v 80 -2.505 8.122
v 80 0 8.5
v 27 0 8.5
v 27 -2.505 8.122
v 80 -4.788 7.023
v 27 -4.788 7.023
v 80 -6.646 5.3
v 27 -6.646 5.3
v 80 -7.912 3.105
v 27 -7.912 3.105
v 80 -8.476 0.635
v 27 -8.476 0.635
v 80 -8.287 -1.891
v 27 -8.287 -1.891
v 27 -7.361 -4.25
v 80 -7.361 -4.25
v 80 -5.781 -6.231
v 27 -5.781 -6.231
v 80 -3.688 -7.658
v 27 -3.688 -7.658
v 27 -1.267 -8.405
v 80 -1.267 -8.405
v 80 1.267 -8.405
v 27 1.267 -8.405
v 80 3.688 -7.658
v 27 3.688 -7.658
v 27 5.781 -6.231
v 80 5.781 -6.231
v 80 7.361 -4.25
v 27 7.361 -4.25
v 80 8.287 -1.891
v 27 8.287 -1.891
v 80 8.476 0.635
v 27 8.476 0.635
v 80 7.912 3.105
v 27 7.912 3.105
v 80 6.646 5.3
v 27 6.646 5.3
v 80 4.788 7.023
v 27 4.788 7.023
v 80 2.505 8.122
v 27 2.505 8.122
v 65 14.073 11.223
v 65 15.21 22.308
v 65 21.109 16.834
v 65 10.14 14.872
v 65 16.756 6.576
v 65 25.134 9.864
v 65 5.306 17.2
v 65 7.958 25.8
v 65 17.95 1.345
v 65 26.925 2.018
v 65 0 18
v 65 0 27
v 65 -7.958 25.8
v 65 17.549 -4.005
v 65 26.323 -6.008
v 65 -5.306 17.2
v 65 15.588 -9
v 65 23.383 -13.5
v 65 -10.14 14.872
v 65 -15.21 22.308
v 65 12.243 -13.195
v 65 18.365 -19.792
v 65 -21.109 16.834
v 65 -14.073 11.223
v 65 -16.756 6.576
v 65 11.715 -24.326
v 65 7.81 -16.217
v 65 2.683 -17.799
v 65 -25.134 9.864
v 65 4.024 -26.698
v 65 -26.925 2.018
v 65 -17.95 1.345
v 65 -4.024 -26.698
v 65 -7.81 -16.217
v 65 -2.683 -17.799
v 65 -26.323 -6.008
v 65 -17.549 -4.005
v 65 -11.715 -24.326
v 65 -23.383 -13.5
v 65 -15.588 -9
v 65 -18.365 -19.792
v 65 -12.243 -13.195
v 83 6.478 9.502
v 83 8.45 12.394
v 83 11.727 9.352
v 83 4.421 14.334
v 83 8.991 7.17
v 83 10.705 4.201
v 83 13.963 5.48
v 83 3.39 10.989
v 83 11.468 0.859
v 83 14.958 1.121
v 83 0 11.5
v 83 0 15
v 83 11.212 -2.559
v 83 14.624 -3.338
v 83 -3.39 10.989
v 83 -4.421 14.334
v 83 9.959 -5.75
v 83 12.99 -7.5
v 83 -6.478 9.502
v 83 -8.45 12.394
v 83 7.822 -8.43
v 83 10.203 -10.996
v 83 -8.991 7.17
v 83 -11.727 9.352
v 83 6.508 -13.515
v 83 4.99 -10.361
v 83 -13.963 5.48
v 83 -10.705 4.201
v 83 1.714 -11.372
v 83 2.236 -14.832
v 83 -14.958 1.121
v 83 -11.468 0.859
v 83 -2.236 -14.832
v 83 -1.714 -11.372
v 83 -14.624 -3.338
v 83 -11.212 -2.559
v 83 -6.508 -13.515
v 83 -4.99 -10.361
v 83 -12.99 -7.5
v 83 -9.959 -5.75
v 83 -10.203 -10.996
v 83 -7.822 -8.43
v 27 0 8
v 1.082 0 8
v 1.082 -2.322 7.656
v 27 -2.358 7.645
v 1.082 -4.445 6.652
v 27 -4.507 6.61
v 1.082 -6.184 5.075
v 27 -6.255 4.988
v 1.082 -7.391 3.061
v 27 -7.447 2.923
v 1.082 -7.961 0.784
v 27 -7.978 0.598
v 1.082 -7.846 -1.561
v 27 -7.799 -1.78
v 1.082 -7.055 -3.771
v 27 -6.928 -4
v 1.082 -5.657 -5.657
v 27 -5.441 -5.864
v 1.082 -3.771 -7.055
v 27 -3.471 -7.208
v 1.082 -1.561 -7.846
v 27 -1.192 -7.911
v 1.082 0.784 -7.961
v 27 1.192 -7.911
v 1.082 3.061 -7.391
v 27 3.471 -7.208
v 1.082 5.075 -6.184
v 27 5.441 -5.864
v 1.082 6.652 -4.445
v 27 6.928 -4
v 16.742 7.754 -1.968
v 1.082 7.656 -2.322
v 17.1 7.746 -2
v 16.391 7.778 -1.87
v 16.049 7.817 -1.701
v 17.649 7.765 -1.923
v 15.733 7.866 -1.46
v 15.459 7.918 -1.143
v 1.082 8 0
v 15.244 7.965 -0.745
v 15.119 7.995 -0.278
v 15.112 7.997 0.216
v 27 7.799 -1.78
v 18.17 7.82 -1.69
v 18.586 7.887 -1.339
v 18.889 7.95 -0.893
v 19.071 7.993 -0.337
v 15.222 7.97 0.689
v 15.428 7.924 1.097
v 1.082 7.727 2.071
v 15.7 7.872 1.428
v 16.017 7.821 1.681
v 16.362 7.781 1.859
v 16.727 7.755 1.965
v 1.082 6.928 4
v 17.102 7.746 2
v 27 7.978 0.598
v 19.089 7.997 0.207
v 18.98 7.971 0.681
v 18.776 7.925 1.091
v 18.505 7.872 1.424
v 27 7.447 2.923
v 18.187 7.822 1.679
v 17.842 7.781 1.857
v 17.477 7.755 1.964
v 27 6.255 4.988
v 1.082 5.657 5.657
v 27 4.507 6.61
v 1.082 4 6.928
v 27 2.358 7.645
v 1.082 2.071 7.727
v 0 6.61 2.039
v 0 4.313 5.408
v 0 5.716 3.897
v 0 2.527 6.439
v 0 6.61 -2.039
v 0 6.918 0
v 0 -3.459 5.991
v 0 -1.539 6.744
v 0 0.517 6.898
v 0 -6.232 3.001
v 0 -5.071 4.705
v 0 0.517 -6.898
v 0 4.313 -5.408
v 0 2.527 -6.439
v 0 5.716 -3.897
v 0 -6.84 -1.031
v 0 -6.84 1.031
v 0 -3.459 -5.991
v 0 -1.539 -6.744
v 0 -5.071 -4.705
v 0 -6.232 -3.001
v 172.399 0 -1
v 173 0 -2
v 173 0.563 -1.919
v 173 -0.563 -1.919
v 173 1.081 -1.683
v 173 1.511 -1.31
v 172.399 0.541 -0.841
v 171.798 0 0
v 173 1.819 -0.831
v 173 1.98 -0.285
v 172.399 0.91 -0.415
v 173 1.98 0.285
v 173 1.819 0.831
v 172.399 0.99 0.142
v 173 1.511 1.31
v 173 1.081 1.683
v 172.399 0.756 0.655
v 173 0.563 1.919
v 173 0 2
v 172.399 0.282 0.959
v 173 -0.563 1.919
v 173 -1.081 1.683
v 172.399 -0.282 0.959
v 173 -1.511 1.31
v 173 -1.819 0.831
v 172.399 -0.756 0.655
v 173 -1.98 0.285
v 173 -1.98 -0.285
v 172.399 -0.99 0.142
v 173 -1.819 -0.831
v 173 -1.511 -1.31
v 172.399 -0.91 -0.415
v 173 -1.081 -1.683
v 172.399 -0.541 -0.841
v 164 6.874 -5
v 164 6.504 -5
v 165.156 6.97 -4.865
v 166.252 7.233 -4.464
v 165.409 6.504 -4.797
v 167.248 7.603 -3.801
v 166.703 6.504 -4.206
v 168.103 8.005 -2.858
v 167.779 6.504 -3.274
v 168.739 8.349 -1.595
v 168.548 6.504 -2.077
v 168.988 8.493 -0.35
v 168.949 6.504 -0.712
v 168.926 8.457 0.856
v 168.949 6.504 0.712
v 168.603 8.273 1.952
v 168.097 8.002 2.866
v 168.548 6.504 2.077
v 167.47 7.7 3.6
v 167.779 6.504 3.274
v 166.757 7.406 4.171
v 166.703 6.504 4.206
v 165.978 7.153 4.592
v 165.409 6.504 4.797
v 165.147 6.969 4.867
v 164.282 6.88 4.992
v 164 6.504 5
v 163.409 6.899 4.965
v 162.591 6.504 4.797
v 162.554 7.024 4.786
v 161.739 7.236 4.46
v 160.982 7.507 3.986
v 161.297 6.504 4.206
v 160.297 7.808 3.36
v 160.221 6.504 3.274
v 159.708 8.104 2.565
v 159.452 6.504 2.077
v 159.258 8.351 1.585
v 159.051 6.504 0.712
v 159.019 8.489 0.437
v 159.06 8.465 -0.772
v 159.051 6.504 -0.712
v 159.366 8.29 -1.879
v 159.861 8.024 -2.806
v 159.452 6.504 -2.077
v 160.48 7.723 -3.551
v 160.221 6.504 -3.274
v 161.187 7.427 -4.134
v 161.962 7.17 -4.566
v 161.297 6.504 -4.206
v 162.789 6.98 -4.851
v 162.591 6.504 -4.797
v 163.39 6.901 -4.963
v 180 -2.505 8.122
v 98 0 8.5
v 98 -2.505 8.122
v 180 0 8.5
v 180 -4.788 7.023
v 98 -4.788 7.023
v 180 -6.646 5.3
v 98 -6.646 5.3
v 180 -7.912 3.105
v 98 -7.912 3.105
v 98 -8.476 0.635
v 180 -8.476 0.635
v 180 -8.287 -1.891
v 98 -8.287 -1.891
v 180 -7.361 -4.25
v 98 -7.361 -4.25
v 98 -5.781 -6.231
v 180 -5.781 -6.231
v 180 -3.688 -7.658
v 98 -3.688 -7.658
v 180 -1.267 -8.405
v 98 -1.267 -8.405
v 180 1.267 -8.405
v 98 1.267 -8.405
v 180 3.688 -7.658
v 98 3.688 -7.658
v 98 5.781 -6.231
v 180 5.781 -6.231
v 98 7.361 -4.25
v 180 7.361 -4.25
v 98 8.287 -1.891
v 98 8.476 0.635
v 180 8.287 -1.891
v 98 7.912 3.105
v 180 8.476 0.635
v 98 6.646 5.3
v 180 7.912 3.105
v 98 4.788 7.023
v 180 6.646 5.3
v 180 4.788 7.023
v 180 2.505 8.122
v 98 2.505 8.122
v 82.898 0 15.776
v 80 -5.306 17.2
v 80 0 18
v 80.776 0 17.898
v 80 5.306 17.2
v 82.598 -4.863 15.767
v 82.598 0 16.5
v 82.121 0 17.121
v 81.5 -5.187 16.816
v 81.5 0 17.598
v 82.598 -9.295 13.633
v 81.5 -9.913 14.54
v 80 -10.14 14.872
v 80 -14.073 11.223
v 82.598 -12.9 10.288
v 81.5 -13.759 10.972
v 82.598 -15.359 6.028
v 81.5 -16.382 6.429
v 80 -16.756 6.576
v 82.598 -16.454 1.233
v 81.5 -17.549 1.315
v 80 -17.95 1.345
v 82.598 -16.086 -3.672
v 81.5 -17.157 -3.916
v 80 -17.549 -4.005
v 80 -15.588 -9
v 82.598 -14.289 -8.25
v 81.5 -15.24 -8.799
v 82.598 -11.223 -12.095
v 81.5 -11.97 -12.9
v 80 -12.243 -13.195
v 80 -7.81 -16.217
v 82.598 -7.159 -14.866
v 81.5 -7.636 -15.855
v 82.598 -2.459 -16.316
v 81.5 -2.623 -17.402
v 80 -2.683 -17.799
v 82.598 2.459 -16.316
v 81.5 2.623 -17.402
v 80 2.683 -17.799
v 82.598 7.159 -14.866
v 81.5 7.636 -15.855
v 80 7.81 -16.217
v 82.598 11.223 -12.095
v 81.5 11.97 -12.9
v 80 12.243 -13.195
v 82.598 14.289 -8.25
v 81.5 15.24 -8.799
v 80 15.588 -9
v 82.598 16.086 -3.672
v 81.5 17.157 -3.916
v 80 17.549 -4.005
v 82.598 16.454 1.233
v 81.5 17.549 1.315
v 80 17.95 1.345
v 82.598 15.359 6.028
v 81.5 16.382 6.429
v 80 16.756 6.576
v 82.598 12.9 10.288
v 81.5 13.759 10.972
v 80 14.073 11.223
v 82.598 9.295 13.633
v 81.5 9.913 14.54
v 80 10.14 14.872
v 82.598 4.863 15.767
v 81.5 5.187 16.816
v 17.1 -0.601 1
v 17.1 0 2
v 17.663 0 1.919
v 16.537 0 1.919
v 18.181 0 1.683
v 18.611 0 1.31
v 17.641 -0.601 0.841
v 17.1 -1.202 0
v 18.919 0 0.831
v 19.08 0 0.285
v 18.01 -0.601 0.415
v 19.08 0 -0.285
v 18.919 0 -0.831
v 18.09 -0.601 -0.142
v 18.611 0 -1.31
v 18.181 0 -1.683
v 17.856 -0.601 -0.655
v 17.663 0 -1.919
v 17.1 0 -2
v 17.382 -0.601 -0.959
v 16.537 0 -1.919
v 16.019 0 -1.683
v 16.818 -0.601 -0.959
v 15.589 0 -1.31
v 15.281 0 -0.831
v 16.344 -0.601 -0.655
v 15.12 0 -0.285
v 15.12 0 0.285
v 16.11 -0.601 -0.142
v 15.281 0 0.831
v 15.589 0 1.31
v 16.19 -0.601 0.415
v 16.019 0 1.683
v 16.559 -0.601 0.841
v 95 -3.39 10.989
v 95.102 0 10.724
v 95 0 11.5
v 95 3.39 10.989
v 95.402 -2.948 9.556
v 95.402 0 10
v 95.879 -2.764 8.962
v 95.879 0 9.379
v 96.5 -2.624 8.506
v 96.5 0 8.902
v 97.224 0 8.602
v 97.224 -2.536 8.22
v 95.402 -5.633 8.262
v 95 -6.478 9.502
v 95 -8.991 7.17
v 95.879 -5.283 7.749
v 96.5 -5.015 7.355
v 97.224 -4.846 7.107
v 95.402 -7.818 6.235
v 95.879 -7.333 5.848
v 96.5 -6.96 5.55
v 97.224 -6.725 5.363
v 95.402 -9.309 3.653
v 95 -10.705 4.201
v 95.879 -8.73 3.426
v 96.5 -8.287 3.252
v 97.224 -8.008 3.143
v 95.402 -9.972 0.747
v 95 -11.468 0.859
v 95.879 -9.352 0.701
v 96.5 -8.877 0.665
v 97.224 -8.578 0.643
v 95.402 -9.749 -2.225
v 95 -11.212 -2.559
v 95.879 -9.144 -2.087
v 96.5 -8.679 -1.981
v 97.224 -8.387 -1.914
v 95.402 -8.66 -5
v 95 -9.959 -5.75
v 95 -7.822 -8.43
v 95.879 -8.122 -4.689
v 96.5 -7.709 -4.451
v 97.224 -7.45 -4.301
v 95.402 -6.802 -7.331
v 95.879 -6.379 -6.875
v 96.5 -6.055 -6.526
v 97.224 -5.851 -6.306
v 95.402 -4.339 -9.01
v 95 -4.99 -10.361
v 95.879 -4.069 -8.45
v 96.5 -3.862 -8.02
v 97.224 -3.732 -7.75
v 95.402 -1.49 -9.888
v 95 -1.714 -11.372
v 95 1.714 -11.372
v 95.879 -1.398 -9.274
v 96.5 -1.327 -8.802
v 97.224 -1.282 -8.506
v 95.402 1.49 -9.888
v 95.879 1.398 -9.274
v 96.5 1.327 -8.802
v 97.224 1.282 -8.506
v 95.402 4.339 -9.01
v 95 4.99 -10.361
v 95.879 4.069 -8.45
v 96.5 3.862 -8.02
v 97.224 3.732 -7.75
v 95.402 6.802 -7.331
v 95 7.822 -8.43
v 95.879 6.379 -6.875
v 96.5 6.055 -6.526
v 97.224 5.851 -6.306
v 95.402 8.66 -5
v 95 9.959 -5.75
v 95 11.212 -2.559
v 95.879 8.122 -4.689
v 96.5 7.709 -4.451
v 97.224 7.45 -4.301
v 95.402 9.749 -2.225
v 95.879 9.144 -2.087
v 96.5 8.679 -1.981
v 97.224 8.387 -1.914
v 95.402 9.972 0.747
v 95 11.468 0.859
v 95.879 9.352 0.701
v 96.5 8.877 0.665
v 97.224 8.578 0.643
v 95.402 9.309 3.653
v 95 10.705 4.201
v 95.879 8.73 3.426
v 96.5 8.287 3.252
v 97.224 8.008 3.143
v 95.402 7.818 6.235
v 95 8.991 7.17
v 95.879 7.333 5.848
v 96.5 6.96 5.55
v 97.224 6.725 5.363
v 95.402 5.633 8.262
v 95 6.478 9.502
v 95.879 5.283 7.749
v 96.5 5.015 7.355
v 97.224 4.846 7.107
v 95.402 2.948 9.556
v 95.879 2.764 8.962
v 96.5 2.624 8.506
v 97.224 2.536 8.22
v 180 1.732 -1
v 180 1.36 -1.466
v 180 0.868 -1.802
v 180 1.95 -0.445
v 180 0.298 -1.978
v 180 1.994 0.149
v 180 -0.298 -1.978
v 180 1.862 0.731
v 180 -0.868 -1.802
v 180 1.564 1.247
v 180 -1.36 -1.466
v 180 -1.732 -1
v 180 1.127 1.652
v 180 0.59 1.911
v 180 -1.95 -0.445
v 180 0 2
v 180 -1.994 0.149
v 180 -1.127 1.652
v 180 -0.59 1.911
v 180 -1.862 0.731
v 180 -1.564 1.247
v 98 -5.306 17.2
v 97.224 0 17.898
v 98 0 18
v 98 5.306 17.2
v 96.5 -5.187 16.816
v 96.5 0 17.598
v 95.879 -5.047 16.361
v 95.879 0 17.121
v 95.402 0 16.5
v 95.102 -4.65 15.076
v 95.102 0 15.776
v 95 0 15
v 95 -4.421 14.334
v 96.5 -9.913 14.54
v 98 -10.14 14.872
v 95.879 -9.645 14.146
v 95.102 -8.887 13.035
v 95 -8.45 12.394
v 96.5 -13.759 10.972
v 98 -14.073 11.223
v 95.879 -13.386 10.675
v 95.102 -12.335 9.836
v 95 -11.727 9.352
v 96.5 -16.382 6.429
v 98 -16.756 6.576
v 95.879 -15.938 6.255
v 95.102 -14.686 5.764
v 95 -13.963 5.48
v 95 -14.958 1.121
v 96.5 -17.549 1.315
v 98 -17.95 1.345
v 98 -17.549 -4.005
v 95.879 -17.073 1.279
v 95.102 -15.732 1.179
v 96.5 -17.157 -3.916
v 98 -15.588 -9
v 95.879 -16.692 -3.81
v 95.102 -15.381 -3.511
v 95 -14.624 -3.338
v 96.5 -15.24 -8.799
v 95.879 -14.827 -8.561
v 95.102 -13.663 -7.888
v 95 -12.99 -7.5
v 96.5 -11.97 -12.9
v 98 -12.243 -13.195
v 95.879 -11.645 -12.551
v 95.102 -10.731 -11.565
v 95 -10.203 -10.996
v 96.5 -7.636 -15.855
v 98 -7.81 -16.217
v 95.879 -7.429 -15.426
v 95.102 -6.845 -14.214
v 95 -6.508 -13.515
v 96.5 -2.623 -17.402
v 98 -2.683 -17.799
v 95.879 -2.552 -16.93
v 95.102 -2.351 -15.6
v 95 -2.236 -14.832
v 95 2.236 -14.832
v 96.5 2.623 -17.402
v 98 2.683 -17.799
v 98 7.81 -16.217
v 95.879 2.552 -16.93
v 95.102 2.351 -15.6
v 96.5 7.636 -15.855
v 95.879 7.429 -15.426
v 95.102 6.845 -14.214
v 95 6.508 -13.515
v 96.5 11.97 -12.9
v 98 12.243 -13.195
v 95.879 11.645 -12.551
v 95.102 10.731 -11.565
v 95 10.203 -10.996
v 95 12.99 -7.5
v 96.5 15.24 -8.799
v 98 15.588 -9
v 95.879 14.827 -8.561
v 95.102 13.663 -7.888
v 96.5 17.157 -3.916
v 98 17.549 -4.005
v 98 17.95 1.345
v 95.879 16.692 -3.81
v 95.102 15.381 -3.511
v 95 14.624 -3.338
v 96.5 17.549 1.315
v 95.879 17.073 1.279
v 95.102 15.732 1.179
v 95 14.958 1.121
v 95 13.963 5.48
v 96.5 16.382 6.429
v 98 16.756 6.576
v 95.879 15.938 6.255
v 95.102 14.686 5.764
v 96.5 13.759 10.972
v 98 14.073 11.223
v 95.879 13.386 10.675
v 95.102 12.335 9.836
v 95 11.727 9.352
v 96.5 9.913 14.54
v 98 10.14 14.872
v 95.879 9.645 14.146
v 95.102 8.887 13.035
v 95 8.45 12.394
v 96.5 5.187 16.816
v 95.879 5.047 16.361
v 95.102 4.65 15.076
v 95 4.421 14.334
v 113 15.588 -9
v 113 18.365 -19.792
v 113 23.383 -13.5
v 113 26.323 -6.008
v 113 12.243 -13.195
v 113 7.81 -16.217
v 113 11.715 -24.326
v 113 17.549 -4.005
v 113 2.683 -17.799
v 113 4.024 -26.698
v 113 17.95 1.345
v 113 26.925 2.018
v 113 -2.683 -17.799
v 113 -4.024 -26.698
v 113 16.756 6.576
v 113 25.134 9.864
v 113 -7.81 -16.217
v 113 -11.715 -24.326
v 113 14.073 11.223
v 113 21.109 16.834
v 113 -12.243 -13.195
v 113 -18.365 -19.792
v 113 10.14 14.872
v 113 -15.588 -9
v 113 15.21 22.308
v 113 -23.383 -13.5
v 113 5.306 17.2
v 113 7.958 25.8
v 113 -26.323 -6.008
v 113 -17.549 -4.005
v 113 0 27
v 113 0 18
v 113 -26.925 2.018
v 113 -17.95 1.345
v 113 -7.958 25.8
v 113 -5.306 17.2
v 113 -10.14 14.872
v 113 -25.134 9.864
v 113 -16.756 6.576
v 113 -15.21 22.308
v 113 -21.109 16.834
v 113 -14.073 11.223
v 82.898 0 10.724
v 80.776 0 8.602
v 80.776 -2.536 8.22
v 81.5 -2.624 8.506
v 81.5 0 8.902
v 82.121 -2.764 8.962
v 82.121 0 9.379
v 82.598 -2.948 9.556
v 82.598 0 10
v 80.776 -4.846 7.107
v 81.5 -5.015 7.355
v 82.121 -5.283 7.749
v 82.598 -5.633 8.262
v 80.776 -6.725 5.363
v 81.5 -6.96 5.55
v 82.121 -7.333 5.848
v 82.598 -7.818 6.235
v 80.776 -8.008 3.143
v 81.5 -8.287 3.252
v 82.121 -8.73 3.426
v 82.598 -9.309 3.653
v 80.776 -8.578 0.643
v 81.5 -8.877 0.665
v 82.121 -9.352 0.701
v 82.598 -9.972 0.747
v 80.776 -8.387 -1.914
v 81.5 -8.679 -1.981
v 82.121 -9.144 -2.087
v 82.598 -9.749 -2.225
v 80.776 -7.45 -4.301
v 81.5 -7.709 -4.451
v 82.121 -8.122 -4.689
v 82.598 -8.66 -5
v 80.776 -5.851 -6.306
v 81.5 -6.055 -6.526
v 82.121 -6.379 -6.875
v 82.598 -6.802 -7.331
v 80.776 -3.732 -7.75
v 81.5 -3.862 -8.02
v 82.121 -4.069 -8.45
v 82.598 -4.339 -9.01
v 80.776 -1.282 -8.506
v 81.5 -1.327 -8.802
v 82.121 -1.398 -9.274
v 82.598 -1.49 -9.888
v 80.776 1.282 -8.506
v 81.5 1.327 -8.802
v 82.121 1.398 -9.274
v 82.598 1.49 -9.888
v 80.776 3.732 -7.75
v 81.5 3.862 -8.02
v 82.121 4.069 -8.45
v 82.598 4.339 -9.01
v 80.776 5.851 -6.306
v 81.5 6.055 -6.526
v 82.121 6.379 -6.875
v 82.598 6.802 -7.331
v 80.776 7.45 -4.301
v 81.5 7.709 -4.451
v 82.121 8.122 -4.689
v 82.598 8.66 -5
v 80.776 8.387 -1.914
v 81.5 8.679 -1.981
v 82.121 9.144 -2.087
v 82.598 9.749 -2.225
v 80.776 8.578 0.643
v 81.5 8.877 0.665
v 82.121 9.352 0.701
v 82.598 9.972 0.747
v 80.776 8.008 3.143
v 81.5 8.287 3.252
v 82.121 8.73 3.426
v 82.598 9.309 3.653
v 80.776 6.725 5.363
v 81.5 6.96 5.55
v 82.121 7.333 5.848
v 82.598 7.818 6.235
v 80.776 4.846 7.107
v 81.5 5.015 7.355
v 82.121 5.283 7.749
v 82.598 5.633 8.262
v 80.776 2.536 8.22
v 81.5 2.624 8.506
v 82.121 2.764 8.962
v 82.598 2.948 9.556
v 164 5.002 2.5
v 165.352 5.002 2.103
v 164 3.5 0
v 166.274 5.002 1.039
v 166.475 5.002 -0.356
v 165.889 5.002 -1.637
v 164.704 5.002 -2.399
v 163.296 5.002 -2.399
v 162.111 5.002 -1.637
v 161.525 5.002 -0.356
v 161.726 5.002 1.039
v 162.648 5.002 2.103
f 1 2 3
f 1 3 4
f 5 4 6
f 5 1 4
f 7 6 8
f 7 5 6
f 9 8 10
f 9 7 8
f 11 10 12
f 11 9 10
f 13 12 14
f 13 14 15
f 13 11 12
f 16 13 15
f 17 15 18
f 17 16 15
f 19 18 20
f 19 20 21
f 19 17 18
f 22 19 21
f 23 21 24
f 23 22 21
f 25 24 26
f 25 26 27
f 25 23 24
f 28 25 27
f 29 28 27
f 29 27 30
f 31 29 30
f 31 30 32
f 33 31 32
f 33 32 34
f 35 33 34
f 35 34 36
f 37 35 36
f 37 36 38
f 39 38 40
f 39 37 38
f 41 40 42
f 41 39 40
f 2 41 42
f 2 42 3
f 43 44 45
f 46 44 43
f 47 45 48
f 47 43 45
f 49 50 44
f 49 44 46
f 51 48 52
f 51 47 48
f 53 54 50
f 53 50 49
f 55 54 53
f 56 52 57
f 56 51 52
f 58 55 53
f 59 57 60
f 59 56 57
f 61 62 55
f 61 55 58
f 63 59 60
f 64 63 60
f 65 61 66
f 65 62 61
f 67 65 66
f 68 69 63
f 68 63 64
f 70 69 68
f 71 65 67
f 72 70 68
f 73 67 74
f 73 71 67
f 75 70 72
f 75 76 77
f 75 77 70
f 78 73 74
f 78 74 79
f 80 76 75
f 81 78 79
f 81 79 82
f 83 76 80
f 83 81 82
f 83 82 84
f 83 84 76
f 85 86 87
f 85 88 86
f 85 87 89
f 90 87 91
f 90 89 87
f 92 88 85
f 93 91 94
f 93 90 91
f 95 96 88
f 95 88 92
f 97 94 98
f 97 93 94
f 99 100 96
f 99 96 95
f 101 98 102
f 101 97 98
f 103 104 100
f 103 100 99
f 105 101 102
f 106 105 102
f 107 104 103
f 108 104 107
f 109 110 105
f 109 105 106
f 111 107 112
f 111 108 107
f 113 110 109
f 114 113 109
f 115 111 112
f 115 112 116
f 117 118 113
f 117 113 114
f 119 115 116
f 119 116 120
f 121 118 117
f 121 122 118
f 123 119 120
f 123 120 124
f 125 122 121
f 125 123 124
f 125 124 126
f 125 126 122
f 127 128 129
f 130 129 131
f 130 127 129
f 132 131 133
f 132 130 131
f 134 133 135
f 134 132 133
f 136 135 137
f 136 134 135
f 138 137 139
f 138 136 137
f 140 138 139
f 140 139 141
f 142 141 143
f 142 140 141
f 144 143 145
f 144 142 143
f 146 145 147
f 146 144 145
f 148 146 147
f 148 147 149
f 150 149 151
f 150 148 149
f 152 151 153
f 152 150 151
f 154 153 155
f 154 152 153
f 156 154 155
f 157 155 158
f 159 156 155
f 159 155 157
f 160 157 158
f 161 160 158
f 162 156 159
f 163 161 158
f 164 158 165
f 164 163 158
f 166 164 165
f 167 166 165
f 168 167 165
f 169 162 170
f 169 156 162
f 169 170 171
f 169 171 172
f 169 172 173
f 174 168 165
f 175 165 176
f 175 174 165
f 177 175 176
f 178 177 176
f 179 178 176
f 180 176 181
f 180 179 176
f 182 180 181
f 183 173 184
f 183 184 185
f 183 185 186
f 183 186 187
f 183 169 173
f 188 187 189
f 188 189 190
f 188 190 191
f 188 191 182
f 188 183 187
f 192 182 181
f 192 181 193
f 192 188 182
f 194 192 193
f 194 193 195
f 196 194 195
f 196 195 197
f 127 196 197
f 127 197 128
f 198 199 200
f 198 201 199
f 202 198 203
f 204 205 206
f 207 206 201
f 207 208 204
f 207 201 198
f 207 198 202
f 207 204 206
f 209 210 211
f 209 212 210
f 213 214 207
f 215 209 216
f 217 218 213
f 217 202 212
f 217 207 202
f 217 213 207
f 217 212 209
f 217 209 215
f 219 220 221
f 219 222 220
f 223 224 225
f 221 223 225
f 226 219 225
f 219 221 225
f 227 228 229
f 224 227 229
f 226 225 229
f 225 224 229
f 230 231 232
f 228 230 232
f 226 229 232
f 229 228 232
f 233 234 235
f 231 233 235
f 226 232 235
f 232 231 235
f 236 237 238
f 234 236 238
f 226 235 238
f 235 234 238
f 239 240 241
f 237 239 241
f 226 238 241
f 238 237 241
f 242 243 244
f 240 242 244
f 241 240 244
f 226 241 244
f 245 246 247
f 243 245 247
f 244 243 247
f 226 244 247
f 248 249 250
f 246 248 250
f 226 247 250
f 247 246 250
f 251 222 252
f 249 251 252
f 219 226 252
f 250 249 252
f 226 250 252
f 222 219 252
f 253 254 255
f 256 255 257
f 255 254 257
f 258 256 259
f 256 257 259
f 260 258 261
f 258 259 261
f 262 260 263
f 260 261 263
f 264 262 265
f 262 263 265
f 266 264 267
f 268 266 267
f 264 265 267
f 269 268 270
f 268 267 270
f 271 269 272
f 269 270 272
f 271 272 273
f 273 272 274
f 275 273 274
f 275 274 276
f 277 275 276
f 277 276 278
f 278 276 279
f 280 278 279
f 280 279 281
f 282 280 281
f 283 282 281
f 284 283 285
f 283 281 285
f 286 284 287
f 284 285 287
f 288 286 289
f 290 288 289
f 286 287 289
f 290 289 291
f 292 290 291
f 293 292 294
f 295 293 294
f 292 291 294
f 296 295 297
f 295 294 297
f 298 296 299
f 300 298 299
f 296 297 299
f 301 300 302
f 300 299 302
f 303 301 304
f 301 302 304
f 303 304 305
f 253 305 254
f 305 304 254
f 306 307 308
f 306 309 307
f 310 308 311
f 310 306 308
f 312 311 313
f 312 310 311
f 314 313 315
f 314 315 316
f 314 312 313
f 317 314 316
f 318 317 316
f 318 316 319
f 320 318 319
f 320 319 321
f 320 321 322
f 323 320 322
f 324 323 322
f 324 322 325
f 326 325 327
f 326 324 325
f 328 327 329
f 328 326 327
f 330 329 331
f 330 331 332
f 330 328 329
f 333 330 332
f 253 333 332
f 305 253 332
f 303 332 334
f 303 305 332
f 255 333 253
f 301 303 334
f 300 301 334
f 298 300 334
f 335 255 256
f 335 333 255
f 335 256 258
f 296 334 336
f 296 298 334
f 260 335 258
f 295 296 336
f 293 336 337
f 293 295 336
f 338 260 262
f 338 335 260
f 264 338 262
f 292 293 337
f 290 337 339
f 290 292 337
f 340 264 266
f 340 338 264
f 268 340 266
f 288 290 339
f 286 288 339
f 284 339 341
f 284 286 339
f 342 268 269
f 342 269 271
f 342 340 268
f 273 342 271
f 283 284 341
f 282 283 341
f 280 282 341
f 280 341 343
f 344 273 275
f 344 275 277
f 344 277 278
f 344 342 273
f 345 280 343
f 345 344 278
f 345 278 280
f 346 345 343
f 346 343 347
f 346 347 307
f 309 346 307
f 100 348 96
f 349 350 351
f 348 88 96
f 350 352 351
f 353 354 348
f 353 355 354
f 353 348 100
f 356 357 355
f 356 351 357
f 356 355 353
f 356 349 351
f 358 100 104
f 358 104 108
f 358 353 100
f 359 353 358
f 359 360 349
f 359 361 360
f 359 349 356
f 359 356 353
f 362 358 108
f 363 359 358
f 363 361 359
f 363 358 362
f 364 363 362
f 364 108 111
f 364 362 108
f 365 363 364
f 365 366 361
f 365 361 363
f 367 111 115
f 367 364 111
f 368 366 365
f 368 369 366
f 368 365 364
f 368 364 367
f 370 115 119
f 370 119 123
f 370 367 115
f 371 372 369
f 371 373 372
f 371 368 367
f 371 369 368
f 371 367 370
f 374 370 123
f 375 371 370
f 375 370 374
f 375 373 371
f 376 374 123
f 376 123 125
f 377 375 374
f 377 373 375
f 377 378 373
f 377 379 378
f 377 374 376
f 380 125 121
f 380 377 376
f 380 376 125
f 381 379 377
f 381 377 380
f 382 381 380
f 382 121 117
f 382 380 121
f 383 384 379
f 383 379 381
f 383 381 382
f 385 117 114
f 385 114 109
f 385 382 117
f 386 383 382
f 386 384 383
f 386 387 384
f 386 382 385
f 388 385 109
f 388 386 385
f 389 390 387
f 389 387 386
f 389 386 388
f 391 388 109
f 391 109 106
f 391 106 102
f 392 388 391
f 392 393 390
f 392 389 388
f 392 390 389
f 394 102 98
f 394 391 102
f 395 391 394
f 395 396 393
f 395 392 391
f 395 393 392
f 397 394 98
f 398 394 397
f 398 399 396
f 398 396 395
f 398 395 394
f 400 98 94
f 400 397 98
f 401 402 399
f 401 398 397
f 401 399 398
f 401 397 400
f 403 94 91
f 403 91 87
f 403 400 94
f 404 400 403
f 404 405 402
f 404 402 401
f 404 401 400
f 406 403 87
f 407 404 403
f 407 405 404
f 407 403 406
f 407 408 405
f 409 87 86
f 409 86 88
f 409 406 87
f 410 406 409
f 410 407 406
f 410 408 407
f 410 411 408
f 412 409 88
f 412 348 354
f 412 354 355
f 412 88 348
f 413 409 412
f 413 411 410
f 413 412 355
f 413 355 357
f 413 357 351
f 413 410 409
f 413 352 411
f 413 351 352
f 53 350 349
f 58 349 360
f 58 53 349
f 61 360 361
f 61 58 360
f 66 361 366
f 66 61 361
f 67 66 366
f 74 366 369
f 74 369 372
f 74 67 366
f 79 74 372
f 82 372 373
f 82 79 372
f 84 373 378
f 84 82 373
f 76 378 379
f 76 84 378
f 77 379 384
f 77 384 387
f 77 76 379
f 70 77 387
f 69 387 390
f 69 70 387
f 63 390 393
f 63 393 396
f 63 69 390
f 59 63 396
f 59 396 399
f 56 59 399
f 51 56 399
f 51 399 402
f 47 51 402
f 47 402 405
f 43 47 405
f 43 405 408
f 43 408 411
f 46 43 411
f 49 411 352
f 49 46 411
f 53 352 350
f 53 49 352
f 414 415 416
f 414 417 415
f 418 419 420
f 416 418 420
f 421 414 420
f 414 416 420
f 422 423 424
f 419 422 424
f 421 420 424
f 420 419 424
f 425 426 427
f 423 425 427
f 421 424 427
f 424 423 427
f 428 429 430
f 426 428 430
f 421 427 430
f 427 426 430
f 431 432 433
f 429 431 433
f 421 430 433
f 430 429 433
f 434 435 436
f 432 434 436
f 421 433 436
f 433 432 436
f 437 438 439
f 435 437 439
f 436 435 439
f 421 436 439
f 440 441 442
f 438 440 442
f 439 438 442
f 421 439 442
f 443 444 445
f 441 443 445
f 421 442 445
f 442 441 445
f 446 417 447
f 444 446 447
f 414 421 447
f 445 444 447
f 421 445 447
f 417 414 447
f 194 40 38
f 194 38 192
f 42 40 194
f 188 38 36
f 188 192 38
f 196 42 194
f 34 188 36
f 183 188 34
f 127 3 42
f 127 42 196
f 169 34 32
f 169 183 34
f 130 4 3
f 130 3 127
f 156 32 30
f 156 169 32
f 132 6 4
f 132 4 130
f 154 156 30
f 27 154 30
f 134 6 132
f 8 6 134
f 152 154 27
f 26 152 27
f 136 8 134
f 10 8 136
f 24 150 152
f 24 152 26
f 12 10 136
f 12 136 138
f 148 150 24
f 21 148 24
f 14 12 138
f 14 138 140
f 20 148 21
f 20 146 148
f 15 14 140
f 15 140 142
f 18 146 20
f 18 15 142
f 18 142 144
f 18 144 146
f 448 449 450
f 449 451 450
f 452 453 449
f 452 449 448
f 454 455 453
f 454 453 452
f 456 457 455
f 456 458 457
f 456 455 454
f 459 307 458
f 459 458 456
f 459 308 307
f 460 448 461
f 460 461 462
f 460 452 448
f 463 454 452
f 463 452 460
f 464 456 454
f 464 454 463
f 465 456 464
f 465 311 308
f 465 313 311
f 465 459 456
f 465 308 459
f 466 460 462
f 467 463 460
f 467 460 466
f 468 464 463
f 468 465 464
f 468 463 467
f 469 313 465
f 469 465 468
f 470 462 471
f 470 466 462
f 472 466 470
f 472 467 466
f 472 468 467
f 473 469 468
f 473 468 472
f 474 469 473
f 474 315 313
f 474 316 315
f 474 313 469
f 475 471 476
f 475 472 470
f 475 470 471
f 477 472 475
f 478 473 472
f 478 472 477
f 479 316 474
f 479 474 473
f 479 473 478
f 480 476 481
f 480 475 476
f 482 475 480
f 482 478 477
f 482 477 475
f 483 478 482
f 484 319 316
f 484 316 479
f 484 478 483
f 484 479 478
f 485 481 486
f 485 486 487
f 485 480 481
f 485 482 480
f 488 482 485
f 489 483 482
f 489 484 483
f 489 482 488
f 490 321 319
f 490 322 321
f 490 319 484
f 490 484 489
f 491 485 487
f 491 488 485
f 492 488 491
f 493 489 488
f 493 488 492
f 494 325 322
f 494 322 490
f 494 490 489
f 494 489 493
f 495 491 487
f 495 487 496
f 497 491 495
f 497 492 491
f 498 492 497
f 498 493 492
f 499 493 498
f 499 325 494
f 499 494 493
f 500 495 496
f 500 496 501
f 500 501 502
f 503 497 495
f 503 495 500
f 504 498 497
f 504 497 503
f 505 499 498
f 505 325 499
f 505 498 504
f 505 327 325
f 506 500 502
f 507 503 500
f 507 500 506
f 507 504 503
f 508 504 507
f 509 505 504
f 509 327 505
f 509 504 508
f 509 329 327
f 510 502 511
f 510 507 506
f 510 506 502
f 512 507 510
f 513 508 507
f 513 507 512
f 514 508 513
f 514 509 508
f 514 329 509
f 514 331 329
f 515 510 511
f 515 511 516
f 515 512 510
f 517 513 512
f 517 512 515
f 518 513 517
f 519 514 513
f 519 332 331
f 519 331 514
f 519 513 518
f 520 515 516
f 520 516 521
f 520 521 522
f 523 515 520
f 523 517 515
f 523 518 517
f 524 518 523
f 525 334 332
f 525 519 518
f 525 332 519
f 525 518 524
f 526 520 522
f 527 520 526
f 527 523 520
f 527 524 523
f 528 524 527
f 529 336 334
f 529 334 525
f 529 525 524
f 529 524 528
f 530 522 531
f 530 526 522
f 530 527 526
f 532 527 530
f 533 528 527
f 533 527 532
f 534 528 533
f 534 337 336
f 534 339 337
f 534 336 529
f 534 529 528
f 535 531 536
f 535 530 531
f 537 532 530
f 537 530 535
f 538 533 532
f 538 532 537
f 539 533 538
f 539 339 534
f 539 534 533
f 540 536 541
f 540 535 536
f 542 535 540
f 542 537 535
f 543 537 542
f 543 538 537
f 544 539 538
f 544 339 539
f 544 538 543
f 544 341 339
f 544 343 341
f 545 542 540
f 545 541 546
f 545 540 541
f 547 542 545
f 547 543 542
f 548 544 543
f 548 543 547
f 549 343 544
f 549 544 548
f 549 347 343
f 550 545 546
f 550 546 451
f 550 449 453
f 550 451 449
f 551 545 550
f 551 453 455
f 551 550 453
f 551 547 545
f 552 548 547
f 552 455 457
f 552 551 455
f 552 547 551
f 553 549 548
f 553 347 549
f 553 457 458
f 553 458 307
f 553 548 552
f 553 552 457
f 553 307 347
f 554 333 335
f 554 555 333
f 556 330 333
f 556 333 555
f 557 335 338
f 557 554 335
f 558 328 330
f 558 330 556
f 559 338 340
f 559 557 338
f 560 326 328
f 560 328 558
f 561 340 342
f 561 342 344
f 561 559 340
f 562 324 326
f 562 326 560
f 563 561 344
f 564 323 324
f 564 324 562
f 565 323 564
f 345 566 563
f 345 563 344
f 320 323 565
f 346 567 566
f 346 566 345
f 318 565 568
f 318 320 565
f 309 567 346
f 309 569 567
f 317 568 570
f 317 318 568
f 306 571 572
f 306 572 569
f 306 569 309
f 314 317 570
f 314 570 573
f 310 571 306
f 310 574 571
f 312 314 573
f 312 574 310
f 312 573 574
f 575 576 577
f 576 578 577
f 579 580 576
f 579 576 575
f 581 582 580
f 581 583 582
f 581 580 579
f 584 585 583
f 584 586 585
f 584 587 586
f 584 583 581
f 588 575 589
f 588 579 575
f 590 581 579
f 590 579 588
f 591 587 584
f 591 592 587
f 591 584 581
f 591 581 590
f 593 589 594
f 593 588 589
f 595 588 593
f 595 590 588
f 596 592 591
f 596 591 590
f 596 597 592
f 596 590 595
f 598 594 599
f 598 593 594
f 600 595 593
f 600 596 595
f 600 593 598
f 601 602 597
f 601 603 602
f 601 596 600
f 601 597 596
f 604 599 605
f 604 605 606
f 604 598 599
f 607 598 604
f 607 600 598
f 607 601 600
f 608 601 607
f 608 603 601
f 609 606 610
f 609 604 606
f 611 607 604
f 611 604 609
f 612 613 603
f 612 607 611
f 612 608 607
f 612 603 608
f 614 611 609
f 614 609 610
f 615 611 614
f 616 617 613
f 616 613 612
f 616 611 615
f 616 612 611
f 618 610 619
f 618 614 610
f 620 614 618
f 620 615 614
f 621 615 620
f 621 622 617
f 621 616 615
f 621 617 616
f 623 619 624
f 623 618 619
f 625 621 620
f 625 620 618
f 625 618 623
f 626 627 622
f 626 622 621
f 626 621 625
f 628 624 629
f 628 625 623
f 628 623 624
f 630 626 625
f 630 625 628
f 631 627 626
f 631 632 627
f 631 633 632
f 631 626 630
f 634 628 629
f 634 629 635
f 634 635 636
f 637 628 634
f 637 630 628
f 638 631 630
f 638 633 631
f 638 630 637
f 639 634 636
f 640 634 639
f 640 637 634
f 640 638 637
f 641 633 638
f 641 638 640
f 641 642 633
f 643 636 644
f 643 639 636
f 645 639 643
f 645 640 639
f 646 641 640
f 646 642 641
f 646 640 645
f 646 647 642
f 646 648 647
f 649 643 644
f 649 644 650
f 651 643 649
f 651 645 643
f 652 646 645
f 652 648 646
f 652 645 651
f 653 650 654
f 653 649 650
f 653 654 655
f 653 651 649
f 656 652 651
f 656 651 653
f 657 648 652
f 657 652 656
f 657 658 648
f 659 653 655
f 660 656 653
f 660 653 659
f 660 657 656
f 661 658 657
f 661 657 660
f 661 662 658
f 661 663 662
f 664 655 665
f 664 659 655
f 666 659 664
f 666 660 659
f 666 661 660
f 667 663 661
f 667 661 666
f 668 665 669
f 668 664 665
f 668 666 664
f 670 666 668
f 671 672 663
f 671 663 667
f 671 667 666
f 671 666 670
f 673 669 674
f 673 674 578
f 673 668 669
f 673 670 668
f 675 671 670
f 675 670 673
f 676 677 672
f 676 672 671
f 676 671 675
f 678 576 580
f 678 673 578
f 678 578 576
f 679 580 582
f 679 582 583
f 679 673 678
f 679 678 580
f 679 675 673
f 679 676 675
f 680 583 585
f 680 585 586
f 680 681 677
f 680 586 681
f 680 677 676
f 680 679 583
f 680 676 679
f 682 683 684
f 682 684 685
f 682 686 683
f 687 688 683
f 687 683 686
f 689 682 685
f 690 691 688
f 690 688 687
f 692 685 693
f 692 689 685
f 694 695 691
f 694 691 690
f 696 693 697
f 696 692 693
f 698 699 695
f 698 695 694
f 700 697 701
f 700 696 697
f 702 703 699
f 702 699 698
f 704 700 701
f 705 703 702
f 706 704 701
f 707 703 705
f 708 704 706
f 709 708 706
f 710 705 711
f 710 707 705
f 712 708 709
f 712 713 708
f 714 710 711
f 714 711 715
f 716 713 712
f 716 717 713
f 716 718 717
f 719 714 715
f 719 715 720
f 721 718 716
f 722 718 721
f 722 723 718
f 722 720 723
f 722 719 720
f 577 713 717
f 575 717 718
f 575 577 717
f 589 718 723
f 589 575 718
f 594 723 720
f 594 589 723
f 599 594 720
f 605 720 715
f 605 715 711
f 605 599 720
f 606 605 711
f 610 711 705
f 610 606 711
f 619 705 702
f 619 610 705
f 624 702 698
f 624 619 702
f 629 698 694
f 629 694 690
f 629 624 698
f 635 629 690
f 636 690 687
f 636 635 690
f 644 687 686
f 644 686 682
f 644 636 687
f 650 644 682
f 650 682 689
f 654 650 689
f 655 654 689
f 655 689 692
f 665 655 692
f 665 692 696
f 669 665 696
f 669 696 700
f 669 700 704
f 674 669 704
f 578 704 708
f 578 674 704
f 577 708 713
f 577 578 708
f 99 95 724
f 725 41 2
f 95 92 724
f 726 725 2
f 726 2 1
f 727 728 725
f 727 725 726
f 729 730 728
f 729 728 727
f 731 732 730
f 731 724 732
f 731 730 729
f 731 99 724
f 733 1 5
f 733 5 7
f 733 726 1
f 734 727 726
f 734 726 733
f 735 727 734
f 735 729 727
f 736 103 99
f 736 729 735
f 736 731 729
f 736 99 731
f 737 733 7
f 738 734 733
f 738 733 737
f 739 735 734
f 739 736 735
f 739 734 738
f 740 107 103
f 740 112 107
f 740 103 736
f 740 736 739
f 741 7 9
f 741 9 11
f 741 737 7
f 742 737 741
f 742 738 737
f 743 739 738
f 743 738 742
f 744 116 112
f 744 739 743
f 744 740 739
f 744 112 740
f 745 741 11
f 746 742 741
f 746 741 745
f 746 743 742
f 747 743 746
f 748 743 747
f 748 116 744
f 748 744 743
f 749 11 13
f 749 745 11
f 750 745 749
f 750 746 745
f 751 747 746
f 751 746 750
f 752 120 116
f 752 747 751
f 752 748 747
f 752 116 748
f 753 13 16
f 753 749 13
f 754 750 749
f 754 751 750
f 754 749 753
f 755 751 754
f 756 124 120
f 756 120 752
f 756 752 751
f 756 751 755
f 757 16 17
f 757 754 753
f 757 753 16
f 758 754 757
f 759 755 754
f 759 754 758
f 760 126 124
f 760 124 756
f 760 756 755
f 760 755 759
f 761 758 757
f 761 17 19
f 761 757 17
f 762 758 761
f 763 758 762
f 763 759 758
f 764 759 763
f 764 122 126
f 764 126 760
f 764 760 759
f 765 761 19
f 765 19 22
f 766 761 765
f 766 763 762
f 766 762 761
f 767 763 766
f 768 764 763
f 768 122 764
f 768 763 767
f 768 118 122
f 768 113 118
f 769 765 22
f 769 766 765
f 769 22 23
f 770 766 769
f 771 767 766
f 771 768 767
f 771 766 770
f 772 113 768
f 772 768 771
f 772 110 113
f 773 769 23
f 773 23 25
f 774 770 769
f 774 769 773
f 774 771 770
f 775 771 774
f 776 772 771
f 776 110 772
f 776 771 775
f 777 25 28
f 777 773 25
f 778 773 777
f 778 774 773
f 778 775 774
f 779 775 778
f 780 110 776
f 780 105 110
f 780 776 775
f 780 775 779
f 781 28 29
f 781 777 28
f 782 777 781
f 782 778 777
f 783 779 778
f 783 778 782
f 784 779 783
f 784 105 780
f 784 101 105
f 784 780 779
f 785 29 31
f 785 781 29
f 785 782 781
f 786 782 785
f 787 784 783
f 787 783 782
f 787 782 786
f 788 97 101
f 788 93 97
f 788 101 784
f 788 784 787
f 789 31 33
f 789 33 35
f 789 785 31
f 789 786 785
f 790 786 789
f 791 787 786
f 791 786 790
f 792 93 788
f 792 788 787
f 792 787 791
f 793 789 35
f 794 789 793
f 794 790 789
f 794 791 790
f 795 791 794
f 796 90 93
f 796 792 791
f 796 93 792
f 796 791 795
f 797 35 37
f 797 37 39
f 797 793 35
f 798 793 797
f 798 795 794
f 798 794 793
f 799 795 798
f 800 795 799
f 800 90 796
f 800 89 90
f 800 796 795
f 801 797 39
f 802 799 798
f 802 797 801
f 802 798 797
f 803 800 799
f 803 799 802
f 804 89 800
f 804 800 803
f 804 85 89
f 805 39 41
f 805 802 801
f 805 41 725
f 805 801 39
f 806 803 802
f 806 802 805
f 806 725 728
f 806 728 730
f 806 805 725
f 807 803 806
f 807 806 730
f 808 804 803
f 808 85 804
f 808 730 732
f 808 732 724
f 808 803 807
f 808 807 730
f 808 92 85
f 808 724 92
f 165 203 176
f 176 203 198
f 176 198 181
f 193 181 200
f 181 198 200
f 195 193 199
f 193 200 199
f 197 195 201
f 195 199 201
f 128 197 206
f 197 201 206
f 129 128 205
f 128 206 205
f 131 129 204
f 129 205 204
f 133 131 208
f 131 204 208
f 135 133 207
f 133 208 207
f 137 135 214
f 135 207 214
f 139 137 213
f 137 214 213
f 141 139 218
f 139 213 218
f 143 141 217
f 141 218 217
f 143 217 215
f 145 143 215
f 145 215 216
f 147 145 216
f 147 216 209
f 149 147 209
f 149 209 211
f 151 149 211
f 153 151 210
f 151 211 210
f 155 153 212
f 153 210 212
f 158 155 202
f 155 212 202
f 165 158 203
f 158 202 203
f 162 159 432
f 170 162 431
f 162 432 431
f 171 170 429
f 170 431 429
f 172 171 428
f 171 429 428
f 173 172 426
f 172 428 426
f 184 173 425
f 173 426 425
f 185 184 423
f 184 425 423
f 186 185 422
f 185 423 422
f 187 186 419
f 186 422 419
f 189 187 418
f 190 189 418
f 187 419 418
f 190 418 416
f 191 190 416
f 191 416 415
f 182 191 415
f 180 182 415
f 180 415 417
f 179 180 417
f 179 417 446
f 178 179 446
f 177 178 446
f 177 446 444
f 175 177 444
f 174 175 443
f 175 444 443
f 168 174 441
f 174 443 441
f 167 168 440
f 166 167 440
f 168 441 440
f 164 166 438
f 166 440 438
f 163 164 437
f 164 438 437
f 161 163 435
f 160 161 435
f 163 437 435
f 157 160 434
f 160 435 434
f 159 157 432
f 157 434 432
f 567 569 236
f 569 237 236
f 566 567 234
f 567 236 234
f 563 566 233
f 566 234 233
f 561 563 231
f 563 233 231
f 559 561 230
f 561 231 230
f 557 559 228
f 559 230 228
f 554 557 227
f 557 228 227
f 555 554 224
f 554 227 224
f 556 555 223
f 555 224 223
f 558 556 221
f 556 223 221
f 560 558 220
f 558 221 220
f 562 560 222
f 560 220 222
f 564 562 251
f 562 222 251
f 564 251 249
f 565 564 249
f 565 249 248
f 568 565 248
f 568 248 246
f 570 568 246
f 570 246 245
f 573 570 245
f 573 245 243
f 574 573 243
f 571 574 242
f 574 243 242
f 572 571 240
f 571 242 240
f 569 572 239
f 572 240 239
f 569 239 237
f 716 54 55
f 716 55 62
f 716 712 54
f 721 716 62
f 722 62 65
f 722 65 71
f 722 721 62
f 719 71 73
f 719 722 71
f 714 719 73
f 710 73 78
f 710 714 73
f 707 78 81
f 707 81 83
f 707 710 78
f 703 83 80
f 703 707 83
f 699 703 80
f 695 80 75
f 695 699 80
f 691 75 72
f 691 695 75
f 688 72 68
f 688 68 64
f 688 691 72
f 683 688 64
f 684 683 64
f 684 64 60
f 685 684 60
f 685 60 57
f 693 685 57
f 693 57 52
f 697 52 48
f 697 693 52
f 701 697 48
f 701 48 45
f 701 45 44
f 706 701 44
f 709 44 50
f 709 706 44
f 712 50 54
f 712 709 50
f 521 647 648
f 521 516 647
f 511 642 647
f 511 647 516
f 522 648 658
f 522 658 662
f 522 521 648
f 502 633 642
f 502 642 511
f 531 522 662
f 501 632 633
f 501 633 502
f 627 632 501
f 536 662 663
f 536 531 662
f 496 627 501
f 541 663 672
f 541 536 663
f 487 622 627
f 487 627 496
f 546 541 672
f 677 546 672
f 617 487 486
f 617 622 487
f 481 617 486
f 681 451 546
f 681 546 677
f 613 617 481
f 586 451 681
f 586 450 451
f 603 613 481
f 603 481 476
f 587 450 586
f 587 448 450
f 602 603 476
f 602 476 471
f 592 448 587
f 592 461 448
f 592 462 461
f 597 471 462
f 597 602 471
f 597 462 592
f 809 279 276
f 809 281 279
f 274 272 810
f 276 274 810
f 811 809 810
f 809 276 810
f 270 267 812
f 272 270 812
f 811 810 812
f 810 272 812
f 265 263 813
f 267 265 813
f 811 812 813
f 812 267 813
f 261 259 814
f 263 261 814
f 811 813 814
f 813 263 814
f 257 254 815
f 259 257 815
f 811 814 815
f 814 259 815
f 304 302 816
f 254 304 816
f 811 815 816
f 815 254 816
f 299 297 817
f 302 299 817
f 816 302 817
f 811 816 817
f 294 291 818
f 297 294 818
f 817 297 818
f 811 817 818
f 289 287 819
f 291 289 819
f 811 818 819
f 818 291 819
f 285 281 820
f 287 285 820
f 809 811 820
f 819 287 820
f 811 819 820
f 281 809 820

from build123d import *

# Parameters (mm, degrees)
FILLET_4_R       = 3
F_4_0MM_4_D      = 4
F_4_0MM_4_DEPTH  = 8
F_4_0MM_4_TIP    = 1.201721238
F_4_0MM_5_D      = 4
F_4_0MM_5_DEPTH  = 7
F_4_0MM_5_TIP    = 1.201721238
F_10_0MM_1_D     = 10
F_10_0MM_1_DEPTH = 1.995696905
F_10_0MM_1_TIP   = 3.004303095


# Read off the part's stored shape, not the designer's step: M16 机械螺纹 螺柱1
with BuildPart() as part:
    # 草图1 → 旋转1 (revolve)
    with BuildSketch(Plane.XY, mode=Mode.PRIVATE) as revolve_1_sk:
        Polygon((0, 0), (0, 8), (27, 8), (27, 8.5), (83, 8.5), (83, 18), (65, 18), (65, 27), (113, 27), (113, 18), (95, 18), (95, 8.5), (180, 8.5), (180, 0), align=None)
    revolve(revolve_1_sk.sketch.rotate(Axis((0, 0, 0), (1, 0, 0)), 90), axis=Axis((0, 0, 0), (1, 0, 0)))

    # 圆角4
    fillet_4_edges = [part.edges().sort_by_distance(p)[0] for p in [
        (95, 0, -8.5),
        (95, 0, -18),
        (83, 0, -18),
        (83, 0, -8.5),
    ]]
    fillet(fillet_4_edges, radius=FILLET_4_R)

    # M16 机械螺纹 螺柱1 outline → M16 机械螺纹 螺柱1 (revolve, cut)
    with BuildSketch(Plane.YX):
        Polygon((8, 1.0825), (6.9175, 0), (8, 0), align=None)
    revolve(axis=Axis((0, 0, 0), (1, 0, 0)), mode=Mode.SUBTRACT)

    # Ø4.0mm 暗销孔4
    with Locations(Plane(origin=(17.1, 8, 0), x_dir=(0, 0, 1), z_dir=(0, 1, 0))):
        with Locations((0, 0)):
            Hole(F_4_0MM_4_D / 2, depth=F_4_0MM_4_DEPTH)
            with Locations((0, 0, -(F_4_0MM_4_DEPTH + F_4_0MM_4_TIP / 2))):  # 118° drill point
                Cone(0, F_4_0MM_4_D / 2, F_4_0MM_4_TIP, mode=Mode.SUBTRACT)

    # Ø4.0mm 暗销孔5
    with Locations(Plane(origin=(180, 0, 0), x_dir=(0, 0, -1), z_dir=(1, 0, 0))):
        with Locations((0, 0)):
            Hole(F_4_0MM_5_D / 2, depth=F_4_0MM_5_DEPTH)
            with Locations((0, 0, -(F_4_0MM_5_DEPTH + F_4_0MM_5_TIP / 2))):  # 118° drill point
                Cone(0, F_4_0MM_5_D / 2, F_4_0MM_5_TIP, mode=Mode.SUBTRACT)

    # Ø10.0mm 暗销孔1
    with Locations(Plane(origin=(164, 8.5, 0), x_dir=(0, 0, 1), z_dir=(0, 1, 0))):
        with Locations((0, 0)):
            Hole(F_10_0MM_1_D / 2, depth=F_10_0MM_1_DEPTH)
            with Locations((0, 0, -(F_10_0MM_1_DEPTH + F_10_0MM_1_TIP / 2))):  # 118° drill point
                Cone(0, F_10_0MM_1_D / 2, F_10_0MM_1_TIP, mode=Mode.SUBTRACT)


solid = part.part
